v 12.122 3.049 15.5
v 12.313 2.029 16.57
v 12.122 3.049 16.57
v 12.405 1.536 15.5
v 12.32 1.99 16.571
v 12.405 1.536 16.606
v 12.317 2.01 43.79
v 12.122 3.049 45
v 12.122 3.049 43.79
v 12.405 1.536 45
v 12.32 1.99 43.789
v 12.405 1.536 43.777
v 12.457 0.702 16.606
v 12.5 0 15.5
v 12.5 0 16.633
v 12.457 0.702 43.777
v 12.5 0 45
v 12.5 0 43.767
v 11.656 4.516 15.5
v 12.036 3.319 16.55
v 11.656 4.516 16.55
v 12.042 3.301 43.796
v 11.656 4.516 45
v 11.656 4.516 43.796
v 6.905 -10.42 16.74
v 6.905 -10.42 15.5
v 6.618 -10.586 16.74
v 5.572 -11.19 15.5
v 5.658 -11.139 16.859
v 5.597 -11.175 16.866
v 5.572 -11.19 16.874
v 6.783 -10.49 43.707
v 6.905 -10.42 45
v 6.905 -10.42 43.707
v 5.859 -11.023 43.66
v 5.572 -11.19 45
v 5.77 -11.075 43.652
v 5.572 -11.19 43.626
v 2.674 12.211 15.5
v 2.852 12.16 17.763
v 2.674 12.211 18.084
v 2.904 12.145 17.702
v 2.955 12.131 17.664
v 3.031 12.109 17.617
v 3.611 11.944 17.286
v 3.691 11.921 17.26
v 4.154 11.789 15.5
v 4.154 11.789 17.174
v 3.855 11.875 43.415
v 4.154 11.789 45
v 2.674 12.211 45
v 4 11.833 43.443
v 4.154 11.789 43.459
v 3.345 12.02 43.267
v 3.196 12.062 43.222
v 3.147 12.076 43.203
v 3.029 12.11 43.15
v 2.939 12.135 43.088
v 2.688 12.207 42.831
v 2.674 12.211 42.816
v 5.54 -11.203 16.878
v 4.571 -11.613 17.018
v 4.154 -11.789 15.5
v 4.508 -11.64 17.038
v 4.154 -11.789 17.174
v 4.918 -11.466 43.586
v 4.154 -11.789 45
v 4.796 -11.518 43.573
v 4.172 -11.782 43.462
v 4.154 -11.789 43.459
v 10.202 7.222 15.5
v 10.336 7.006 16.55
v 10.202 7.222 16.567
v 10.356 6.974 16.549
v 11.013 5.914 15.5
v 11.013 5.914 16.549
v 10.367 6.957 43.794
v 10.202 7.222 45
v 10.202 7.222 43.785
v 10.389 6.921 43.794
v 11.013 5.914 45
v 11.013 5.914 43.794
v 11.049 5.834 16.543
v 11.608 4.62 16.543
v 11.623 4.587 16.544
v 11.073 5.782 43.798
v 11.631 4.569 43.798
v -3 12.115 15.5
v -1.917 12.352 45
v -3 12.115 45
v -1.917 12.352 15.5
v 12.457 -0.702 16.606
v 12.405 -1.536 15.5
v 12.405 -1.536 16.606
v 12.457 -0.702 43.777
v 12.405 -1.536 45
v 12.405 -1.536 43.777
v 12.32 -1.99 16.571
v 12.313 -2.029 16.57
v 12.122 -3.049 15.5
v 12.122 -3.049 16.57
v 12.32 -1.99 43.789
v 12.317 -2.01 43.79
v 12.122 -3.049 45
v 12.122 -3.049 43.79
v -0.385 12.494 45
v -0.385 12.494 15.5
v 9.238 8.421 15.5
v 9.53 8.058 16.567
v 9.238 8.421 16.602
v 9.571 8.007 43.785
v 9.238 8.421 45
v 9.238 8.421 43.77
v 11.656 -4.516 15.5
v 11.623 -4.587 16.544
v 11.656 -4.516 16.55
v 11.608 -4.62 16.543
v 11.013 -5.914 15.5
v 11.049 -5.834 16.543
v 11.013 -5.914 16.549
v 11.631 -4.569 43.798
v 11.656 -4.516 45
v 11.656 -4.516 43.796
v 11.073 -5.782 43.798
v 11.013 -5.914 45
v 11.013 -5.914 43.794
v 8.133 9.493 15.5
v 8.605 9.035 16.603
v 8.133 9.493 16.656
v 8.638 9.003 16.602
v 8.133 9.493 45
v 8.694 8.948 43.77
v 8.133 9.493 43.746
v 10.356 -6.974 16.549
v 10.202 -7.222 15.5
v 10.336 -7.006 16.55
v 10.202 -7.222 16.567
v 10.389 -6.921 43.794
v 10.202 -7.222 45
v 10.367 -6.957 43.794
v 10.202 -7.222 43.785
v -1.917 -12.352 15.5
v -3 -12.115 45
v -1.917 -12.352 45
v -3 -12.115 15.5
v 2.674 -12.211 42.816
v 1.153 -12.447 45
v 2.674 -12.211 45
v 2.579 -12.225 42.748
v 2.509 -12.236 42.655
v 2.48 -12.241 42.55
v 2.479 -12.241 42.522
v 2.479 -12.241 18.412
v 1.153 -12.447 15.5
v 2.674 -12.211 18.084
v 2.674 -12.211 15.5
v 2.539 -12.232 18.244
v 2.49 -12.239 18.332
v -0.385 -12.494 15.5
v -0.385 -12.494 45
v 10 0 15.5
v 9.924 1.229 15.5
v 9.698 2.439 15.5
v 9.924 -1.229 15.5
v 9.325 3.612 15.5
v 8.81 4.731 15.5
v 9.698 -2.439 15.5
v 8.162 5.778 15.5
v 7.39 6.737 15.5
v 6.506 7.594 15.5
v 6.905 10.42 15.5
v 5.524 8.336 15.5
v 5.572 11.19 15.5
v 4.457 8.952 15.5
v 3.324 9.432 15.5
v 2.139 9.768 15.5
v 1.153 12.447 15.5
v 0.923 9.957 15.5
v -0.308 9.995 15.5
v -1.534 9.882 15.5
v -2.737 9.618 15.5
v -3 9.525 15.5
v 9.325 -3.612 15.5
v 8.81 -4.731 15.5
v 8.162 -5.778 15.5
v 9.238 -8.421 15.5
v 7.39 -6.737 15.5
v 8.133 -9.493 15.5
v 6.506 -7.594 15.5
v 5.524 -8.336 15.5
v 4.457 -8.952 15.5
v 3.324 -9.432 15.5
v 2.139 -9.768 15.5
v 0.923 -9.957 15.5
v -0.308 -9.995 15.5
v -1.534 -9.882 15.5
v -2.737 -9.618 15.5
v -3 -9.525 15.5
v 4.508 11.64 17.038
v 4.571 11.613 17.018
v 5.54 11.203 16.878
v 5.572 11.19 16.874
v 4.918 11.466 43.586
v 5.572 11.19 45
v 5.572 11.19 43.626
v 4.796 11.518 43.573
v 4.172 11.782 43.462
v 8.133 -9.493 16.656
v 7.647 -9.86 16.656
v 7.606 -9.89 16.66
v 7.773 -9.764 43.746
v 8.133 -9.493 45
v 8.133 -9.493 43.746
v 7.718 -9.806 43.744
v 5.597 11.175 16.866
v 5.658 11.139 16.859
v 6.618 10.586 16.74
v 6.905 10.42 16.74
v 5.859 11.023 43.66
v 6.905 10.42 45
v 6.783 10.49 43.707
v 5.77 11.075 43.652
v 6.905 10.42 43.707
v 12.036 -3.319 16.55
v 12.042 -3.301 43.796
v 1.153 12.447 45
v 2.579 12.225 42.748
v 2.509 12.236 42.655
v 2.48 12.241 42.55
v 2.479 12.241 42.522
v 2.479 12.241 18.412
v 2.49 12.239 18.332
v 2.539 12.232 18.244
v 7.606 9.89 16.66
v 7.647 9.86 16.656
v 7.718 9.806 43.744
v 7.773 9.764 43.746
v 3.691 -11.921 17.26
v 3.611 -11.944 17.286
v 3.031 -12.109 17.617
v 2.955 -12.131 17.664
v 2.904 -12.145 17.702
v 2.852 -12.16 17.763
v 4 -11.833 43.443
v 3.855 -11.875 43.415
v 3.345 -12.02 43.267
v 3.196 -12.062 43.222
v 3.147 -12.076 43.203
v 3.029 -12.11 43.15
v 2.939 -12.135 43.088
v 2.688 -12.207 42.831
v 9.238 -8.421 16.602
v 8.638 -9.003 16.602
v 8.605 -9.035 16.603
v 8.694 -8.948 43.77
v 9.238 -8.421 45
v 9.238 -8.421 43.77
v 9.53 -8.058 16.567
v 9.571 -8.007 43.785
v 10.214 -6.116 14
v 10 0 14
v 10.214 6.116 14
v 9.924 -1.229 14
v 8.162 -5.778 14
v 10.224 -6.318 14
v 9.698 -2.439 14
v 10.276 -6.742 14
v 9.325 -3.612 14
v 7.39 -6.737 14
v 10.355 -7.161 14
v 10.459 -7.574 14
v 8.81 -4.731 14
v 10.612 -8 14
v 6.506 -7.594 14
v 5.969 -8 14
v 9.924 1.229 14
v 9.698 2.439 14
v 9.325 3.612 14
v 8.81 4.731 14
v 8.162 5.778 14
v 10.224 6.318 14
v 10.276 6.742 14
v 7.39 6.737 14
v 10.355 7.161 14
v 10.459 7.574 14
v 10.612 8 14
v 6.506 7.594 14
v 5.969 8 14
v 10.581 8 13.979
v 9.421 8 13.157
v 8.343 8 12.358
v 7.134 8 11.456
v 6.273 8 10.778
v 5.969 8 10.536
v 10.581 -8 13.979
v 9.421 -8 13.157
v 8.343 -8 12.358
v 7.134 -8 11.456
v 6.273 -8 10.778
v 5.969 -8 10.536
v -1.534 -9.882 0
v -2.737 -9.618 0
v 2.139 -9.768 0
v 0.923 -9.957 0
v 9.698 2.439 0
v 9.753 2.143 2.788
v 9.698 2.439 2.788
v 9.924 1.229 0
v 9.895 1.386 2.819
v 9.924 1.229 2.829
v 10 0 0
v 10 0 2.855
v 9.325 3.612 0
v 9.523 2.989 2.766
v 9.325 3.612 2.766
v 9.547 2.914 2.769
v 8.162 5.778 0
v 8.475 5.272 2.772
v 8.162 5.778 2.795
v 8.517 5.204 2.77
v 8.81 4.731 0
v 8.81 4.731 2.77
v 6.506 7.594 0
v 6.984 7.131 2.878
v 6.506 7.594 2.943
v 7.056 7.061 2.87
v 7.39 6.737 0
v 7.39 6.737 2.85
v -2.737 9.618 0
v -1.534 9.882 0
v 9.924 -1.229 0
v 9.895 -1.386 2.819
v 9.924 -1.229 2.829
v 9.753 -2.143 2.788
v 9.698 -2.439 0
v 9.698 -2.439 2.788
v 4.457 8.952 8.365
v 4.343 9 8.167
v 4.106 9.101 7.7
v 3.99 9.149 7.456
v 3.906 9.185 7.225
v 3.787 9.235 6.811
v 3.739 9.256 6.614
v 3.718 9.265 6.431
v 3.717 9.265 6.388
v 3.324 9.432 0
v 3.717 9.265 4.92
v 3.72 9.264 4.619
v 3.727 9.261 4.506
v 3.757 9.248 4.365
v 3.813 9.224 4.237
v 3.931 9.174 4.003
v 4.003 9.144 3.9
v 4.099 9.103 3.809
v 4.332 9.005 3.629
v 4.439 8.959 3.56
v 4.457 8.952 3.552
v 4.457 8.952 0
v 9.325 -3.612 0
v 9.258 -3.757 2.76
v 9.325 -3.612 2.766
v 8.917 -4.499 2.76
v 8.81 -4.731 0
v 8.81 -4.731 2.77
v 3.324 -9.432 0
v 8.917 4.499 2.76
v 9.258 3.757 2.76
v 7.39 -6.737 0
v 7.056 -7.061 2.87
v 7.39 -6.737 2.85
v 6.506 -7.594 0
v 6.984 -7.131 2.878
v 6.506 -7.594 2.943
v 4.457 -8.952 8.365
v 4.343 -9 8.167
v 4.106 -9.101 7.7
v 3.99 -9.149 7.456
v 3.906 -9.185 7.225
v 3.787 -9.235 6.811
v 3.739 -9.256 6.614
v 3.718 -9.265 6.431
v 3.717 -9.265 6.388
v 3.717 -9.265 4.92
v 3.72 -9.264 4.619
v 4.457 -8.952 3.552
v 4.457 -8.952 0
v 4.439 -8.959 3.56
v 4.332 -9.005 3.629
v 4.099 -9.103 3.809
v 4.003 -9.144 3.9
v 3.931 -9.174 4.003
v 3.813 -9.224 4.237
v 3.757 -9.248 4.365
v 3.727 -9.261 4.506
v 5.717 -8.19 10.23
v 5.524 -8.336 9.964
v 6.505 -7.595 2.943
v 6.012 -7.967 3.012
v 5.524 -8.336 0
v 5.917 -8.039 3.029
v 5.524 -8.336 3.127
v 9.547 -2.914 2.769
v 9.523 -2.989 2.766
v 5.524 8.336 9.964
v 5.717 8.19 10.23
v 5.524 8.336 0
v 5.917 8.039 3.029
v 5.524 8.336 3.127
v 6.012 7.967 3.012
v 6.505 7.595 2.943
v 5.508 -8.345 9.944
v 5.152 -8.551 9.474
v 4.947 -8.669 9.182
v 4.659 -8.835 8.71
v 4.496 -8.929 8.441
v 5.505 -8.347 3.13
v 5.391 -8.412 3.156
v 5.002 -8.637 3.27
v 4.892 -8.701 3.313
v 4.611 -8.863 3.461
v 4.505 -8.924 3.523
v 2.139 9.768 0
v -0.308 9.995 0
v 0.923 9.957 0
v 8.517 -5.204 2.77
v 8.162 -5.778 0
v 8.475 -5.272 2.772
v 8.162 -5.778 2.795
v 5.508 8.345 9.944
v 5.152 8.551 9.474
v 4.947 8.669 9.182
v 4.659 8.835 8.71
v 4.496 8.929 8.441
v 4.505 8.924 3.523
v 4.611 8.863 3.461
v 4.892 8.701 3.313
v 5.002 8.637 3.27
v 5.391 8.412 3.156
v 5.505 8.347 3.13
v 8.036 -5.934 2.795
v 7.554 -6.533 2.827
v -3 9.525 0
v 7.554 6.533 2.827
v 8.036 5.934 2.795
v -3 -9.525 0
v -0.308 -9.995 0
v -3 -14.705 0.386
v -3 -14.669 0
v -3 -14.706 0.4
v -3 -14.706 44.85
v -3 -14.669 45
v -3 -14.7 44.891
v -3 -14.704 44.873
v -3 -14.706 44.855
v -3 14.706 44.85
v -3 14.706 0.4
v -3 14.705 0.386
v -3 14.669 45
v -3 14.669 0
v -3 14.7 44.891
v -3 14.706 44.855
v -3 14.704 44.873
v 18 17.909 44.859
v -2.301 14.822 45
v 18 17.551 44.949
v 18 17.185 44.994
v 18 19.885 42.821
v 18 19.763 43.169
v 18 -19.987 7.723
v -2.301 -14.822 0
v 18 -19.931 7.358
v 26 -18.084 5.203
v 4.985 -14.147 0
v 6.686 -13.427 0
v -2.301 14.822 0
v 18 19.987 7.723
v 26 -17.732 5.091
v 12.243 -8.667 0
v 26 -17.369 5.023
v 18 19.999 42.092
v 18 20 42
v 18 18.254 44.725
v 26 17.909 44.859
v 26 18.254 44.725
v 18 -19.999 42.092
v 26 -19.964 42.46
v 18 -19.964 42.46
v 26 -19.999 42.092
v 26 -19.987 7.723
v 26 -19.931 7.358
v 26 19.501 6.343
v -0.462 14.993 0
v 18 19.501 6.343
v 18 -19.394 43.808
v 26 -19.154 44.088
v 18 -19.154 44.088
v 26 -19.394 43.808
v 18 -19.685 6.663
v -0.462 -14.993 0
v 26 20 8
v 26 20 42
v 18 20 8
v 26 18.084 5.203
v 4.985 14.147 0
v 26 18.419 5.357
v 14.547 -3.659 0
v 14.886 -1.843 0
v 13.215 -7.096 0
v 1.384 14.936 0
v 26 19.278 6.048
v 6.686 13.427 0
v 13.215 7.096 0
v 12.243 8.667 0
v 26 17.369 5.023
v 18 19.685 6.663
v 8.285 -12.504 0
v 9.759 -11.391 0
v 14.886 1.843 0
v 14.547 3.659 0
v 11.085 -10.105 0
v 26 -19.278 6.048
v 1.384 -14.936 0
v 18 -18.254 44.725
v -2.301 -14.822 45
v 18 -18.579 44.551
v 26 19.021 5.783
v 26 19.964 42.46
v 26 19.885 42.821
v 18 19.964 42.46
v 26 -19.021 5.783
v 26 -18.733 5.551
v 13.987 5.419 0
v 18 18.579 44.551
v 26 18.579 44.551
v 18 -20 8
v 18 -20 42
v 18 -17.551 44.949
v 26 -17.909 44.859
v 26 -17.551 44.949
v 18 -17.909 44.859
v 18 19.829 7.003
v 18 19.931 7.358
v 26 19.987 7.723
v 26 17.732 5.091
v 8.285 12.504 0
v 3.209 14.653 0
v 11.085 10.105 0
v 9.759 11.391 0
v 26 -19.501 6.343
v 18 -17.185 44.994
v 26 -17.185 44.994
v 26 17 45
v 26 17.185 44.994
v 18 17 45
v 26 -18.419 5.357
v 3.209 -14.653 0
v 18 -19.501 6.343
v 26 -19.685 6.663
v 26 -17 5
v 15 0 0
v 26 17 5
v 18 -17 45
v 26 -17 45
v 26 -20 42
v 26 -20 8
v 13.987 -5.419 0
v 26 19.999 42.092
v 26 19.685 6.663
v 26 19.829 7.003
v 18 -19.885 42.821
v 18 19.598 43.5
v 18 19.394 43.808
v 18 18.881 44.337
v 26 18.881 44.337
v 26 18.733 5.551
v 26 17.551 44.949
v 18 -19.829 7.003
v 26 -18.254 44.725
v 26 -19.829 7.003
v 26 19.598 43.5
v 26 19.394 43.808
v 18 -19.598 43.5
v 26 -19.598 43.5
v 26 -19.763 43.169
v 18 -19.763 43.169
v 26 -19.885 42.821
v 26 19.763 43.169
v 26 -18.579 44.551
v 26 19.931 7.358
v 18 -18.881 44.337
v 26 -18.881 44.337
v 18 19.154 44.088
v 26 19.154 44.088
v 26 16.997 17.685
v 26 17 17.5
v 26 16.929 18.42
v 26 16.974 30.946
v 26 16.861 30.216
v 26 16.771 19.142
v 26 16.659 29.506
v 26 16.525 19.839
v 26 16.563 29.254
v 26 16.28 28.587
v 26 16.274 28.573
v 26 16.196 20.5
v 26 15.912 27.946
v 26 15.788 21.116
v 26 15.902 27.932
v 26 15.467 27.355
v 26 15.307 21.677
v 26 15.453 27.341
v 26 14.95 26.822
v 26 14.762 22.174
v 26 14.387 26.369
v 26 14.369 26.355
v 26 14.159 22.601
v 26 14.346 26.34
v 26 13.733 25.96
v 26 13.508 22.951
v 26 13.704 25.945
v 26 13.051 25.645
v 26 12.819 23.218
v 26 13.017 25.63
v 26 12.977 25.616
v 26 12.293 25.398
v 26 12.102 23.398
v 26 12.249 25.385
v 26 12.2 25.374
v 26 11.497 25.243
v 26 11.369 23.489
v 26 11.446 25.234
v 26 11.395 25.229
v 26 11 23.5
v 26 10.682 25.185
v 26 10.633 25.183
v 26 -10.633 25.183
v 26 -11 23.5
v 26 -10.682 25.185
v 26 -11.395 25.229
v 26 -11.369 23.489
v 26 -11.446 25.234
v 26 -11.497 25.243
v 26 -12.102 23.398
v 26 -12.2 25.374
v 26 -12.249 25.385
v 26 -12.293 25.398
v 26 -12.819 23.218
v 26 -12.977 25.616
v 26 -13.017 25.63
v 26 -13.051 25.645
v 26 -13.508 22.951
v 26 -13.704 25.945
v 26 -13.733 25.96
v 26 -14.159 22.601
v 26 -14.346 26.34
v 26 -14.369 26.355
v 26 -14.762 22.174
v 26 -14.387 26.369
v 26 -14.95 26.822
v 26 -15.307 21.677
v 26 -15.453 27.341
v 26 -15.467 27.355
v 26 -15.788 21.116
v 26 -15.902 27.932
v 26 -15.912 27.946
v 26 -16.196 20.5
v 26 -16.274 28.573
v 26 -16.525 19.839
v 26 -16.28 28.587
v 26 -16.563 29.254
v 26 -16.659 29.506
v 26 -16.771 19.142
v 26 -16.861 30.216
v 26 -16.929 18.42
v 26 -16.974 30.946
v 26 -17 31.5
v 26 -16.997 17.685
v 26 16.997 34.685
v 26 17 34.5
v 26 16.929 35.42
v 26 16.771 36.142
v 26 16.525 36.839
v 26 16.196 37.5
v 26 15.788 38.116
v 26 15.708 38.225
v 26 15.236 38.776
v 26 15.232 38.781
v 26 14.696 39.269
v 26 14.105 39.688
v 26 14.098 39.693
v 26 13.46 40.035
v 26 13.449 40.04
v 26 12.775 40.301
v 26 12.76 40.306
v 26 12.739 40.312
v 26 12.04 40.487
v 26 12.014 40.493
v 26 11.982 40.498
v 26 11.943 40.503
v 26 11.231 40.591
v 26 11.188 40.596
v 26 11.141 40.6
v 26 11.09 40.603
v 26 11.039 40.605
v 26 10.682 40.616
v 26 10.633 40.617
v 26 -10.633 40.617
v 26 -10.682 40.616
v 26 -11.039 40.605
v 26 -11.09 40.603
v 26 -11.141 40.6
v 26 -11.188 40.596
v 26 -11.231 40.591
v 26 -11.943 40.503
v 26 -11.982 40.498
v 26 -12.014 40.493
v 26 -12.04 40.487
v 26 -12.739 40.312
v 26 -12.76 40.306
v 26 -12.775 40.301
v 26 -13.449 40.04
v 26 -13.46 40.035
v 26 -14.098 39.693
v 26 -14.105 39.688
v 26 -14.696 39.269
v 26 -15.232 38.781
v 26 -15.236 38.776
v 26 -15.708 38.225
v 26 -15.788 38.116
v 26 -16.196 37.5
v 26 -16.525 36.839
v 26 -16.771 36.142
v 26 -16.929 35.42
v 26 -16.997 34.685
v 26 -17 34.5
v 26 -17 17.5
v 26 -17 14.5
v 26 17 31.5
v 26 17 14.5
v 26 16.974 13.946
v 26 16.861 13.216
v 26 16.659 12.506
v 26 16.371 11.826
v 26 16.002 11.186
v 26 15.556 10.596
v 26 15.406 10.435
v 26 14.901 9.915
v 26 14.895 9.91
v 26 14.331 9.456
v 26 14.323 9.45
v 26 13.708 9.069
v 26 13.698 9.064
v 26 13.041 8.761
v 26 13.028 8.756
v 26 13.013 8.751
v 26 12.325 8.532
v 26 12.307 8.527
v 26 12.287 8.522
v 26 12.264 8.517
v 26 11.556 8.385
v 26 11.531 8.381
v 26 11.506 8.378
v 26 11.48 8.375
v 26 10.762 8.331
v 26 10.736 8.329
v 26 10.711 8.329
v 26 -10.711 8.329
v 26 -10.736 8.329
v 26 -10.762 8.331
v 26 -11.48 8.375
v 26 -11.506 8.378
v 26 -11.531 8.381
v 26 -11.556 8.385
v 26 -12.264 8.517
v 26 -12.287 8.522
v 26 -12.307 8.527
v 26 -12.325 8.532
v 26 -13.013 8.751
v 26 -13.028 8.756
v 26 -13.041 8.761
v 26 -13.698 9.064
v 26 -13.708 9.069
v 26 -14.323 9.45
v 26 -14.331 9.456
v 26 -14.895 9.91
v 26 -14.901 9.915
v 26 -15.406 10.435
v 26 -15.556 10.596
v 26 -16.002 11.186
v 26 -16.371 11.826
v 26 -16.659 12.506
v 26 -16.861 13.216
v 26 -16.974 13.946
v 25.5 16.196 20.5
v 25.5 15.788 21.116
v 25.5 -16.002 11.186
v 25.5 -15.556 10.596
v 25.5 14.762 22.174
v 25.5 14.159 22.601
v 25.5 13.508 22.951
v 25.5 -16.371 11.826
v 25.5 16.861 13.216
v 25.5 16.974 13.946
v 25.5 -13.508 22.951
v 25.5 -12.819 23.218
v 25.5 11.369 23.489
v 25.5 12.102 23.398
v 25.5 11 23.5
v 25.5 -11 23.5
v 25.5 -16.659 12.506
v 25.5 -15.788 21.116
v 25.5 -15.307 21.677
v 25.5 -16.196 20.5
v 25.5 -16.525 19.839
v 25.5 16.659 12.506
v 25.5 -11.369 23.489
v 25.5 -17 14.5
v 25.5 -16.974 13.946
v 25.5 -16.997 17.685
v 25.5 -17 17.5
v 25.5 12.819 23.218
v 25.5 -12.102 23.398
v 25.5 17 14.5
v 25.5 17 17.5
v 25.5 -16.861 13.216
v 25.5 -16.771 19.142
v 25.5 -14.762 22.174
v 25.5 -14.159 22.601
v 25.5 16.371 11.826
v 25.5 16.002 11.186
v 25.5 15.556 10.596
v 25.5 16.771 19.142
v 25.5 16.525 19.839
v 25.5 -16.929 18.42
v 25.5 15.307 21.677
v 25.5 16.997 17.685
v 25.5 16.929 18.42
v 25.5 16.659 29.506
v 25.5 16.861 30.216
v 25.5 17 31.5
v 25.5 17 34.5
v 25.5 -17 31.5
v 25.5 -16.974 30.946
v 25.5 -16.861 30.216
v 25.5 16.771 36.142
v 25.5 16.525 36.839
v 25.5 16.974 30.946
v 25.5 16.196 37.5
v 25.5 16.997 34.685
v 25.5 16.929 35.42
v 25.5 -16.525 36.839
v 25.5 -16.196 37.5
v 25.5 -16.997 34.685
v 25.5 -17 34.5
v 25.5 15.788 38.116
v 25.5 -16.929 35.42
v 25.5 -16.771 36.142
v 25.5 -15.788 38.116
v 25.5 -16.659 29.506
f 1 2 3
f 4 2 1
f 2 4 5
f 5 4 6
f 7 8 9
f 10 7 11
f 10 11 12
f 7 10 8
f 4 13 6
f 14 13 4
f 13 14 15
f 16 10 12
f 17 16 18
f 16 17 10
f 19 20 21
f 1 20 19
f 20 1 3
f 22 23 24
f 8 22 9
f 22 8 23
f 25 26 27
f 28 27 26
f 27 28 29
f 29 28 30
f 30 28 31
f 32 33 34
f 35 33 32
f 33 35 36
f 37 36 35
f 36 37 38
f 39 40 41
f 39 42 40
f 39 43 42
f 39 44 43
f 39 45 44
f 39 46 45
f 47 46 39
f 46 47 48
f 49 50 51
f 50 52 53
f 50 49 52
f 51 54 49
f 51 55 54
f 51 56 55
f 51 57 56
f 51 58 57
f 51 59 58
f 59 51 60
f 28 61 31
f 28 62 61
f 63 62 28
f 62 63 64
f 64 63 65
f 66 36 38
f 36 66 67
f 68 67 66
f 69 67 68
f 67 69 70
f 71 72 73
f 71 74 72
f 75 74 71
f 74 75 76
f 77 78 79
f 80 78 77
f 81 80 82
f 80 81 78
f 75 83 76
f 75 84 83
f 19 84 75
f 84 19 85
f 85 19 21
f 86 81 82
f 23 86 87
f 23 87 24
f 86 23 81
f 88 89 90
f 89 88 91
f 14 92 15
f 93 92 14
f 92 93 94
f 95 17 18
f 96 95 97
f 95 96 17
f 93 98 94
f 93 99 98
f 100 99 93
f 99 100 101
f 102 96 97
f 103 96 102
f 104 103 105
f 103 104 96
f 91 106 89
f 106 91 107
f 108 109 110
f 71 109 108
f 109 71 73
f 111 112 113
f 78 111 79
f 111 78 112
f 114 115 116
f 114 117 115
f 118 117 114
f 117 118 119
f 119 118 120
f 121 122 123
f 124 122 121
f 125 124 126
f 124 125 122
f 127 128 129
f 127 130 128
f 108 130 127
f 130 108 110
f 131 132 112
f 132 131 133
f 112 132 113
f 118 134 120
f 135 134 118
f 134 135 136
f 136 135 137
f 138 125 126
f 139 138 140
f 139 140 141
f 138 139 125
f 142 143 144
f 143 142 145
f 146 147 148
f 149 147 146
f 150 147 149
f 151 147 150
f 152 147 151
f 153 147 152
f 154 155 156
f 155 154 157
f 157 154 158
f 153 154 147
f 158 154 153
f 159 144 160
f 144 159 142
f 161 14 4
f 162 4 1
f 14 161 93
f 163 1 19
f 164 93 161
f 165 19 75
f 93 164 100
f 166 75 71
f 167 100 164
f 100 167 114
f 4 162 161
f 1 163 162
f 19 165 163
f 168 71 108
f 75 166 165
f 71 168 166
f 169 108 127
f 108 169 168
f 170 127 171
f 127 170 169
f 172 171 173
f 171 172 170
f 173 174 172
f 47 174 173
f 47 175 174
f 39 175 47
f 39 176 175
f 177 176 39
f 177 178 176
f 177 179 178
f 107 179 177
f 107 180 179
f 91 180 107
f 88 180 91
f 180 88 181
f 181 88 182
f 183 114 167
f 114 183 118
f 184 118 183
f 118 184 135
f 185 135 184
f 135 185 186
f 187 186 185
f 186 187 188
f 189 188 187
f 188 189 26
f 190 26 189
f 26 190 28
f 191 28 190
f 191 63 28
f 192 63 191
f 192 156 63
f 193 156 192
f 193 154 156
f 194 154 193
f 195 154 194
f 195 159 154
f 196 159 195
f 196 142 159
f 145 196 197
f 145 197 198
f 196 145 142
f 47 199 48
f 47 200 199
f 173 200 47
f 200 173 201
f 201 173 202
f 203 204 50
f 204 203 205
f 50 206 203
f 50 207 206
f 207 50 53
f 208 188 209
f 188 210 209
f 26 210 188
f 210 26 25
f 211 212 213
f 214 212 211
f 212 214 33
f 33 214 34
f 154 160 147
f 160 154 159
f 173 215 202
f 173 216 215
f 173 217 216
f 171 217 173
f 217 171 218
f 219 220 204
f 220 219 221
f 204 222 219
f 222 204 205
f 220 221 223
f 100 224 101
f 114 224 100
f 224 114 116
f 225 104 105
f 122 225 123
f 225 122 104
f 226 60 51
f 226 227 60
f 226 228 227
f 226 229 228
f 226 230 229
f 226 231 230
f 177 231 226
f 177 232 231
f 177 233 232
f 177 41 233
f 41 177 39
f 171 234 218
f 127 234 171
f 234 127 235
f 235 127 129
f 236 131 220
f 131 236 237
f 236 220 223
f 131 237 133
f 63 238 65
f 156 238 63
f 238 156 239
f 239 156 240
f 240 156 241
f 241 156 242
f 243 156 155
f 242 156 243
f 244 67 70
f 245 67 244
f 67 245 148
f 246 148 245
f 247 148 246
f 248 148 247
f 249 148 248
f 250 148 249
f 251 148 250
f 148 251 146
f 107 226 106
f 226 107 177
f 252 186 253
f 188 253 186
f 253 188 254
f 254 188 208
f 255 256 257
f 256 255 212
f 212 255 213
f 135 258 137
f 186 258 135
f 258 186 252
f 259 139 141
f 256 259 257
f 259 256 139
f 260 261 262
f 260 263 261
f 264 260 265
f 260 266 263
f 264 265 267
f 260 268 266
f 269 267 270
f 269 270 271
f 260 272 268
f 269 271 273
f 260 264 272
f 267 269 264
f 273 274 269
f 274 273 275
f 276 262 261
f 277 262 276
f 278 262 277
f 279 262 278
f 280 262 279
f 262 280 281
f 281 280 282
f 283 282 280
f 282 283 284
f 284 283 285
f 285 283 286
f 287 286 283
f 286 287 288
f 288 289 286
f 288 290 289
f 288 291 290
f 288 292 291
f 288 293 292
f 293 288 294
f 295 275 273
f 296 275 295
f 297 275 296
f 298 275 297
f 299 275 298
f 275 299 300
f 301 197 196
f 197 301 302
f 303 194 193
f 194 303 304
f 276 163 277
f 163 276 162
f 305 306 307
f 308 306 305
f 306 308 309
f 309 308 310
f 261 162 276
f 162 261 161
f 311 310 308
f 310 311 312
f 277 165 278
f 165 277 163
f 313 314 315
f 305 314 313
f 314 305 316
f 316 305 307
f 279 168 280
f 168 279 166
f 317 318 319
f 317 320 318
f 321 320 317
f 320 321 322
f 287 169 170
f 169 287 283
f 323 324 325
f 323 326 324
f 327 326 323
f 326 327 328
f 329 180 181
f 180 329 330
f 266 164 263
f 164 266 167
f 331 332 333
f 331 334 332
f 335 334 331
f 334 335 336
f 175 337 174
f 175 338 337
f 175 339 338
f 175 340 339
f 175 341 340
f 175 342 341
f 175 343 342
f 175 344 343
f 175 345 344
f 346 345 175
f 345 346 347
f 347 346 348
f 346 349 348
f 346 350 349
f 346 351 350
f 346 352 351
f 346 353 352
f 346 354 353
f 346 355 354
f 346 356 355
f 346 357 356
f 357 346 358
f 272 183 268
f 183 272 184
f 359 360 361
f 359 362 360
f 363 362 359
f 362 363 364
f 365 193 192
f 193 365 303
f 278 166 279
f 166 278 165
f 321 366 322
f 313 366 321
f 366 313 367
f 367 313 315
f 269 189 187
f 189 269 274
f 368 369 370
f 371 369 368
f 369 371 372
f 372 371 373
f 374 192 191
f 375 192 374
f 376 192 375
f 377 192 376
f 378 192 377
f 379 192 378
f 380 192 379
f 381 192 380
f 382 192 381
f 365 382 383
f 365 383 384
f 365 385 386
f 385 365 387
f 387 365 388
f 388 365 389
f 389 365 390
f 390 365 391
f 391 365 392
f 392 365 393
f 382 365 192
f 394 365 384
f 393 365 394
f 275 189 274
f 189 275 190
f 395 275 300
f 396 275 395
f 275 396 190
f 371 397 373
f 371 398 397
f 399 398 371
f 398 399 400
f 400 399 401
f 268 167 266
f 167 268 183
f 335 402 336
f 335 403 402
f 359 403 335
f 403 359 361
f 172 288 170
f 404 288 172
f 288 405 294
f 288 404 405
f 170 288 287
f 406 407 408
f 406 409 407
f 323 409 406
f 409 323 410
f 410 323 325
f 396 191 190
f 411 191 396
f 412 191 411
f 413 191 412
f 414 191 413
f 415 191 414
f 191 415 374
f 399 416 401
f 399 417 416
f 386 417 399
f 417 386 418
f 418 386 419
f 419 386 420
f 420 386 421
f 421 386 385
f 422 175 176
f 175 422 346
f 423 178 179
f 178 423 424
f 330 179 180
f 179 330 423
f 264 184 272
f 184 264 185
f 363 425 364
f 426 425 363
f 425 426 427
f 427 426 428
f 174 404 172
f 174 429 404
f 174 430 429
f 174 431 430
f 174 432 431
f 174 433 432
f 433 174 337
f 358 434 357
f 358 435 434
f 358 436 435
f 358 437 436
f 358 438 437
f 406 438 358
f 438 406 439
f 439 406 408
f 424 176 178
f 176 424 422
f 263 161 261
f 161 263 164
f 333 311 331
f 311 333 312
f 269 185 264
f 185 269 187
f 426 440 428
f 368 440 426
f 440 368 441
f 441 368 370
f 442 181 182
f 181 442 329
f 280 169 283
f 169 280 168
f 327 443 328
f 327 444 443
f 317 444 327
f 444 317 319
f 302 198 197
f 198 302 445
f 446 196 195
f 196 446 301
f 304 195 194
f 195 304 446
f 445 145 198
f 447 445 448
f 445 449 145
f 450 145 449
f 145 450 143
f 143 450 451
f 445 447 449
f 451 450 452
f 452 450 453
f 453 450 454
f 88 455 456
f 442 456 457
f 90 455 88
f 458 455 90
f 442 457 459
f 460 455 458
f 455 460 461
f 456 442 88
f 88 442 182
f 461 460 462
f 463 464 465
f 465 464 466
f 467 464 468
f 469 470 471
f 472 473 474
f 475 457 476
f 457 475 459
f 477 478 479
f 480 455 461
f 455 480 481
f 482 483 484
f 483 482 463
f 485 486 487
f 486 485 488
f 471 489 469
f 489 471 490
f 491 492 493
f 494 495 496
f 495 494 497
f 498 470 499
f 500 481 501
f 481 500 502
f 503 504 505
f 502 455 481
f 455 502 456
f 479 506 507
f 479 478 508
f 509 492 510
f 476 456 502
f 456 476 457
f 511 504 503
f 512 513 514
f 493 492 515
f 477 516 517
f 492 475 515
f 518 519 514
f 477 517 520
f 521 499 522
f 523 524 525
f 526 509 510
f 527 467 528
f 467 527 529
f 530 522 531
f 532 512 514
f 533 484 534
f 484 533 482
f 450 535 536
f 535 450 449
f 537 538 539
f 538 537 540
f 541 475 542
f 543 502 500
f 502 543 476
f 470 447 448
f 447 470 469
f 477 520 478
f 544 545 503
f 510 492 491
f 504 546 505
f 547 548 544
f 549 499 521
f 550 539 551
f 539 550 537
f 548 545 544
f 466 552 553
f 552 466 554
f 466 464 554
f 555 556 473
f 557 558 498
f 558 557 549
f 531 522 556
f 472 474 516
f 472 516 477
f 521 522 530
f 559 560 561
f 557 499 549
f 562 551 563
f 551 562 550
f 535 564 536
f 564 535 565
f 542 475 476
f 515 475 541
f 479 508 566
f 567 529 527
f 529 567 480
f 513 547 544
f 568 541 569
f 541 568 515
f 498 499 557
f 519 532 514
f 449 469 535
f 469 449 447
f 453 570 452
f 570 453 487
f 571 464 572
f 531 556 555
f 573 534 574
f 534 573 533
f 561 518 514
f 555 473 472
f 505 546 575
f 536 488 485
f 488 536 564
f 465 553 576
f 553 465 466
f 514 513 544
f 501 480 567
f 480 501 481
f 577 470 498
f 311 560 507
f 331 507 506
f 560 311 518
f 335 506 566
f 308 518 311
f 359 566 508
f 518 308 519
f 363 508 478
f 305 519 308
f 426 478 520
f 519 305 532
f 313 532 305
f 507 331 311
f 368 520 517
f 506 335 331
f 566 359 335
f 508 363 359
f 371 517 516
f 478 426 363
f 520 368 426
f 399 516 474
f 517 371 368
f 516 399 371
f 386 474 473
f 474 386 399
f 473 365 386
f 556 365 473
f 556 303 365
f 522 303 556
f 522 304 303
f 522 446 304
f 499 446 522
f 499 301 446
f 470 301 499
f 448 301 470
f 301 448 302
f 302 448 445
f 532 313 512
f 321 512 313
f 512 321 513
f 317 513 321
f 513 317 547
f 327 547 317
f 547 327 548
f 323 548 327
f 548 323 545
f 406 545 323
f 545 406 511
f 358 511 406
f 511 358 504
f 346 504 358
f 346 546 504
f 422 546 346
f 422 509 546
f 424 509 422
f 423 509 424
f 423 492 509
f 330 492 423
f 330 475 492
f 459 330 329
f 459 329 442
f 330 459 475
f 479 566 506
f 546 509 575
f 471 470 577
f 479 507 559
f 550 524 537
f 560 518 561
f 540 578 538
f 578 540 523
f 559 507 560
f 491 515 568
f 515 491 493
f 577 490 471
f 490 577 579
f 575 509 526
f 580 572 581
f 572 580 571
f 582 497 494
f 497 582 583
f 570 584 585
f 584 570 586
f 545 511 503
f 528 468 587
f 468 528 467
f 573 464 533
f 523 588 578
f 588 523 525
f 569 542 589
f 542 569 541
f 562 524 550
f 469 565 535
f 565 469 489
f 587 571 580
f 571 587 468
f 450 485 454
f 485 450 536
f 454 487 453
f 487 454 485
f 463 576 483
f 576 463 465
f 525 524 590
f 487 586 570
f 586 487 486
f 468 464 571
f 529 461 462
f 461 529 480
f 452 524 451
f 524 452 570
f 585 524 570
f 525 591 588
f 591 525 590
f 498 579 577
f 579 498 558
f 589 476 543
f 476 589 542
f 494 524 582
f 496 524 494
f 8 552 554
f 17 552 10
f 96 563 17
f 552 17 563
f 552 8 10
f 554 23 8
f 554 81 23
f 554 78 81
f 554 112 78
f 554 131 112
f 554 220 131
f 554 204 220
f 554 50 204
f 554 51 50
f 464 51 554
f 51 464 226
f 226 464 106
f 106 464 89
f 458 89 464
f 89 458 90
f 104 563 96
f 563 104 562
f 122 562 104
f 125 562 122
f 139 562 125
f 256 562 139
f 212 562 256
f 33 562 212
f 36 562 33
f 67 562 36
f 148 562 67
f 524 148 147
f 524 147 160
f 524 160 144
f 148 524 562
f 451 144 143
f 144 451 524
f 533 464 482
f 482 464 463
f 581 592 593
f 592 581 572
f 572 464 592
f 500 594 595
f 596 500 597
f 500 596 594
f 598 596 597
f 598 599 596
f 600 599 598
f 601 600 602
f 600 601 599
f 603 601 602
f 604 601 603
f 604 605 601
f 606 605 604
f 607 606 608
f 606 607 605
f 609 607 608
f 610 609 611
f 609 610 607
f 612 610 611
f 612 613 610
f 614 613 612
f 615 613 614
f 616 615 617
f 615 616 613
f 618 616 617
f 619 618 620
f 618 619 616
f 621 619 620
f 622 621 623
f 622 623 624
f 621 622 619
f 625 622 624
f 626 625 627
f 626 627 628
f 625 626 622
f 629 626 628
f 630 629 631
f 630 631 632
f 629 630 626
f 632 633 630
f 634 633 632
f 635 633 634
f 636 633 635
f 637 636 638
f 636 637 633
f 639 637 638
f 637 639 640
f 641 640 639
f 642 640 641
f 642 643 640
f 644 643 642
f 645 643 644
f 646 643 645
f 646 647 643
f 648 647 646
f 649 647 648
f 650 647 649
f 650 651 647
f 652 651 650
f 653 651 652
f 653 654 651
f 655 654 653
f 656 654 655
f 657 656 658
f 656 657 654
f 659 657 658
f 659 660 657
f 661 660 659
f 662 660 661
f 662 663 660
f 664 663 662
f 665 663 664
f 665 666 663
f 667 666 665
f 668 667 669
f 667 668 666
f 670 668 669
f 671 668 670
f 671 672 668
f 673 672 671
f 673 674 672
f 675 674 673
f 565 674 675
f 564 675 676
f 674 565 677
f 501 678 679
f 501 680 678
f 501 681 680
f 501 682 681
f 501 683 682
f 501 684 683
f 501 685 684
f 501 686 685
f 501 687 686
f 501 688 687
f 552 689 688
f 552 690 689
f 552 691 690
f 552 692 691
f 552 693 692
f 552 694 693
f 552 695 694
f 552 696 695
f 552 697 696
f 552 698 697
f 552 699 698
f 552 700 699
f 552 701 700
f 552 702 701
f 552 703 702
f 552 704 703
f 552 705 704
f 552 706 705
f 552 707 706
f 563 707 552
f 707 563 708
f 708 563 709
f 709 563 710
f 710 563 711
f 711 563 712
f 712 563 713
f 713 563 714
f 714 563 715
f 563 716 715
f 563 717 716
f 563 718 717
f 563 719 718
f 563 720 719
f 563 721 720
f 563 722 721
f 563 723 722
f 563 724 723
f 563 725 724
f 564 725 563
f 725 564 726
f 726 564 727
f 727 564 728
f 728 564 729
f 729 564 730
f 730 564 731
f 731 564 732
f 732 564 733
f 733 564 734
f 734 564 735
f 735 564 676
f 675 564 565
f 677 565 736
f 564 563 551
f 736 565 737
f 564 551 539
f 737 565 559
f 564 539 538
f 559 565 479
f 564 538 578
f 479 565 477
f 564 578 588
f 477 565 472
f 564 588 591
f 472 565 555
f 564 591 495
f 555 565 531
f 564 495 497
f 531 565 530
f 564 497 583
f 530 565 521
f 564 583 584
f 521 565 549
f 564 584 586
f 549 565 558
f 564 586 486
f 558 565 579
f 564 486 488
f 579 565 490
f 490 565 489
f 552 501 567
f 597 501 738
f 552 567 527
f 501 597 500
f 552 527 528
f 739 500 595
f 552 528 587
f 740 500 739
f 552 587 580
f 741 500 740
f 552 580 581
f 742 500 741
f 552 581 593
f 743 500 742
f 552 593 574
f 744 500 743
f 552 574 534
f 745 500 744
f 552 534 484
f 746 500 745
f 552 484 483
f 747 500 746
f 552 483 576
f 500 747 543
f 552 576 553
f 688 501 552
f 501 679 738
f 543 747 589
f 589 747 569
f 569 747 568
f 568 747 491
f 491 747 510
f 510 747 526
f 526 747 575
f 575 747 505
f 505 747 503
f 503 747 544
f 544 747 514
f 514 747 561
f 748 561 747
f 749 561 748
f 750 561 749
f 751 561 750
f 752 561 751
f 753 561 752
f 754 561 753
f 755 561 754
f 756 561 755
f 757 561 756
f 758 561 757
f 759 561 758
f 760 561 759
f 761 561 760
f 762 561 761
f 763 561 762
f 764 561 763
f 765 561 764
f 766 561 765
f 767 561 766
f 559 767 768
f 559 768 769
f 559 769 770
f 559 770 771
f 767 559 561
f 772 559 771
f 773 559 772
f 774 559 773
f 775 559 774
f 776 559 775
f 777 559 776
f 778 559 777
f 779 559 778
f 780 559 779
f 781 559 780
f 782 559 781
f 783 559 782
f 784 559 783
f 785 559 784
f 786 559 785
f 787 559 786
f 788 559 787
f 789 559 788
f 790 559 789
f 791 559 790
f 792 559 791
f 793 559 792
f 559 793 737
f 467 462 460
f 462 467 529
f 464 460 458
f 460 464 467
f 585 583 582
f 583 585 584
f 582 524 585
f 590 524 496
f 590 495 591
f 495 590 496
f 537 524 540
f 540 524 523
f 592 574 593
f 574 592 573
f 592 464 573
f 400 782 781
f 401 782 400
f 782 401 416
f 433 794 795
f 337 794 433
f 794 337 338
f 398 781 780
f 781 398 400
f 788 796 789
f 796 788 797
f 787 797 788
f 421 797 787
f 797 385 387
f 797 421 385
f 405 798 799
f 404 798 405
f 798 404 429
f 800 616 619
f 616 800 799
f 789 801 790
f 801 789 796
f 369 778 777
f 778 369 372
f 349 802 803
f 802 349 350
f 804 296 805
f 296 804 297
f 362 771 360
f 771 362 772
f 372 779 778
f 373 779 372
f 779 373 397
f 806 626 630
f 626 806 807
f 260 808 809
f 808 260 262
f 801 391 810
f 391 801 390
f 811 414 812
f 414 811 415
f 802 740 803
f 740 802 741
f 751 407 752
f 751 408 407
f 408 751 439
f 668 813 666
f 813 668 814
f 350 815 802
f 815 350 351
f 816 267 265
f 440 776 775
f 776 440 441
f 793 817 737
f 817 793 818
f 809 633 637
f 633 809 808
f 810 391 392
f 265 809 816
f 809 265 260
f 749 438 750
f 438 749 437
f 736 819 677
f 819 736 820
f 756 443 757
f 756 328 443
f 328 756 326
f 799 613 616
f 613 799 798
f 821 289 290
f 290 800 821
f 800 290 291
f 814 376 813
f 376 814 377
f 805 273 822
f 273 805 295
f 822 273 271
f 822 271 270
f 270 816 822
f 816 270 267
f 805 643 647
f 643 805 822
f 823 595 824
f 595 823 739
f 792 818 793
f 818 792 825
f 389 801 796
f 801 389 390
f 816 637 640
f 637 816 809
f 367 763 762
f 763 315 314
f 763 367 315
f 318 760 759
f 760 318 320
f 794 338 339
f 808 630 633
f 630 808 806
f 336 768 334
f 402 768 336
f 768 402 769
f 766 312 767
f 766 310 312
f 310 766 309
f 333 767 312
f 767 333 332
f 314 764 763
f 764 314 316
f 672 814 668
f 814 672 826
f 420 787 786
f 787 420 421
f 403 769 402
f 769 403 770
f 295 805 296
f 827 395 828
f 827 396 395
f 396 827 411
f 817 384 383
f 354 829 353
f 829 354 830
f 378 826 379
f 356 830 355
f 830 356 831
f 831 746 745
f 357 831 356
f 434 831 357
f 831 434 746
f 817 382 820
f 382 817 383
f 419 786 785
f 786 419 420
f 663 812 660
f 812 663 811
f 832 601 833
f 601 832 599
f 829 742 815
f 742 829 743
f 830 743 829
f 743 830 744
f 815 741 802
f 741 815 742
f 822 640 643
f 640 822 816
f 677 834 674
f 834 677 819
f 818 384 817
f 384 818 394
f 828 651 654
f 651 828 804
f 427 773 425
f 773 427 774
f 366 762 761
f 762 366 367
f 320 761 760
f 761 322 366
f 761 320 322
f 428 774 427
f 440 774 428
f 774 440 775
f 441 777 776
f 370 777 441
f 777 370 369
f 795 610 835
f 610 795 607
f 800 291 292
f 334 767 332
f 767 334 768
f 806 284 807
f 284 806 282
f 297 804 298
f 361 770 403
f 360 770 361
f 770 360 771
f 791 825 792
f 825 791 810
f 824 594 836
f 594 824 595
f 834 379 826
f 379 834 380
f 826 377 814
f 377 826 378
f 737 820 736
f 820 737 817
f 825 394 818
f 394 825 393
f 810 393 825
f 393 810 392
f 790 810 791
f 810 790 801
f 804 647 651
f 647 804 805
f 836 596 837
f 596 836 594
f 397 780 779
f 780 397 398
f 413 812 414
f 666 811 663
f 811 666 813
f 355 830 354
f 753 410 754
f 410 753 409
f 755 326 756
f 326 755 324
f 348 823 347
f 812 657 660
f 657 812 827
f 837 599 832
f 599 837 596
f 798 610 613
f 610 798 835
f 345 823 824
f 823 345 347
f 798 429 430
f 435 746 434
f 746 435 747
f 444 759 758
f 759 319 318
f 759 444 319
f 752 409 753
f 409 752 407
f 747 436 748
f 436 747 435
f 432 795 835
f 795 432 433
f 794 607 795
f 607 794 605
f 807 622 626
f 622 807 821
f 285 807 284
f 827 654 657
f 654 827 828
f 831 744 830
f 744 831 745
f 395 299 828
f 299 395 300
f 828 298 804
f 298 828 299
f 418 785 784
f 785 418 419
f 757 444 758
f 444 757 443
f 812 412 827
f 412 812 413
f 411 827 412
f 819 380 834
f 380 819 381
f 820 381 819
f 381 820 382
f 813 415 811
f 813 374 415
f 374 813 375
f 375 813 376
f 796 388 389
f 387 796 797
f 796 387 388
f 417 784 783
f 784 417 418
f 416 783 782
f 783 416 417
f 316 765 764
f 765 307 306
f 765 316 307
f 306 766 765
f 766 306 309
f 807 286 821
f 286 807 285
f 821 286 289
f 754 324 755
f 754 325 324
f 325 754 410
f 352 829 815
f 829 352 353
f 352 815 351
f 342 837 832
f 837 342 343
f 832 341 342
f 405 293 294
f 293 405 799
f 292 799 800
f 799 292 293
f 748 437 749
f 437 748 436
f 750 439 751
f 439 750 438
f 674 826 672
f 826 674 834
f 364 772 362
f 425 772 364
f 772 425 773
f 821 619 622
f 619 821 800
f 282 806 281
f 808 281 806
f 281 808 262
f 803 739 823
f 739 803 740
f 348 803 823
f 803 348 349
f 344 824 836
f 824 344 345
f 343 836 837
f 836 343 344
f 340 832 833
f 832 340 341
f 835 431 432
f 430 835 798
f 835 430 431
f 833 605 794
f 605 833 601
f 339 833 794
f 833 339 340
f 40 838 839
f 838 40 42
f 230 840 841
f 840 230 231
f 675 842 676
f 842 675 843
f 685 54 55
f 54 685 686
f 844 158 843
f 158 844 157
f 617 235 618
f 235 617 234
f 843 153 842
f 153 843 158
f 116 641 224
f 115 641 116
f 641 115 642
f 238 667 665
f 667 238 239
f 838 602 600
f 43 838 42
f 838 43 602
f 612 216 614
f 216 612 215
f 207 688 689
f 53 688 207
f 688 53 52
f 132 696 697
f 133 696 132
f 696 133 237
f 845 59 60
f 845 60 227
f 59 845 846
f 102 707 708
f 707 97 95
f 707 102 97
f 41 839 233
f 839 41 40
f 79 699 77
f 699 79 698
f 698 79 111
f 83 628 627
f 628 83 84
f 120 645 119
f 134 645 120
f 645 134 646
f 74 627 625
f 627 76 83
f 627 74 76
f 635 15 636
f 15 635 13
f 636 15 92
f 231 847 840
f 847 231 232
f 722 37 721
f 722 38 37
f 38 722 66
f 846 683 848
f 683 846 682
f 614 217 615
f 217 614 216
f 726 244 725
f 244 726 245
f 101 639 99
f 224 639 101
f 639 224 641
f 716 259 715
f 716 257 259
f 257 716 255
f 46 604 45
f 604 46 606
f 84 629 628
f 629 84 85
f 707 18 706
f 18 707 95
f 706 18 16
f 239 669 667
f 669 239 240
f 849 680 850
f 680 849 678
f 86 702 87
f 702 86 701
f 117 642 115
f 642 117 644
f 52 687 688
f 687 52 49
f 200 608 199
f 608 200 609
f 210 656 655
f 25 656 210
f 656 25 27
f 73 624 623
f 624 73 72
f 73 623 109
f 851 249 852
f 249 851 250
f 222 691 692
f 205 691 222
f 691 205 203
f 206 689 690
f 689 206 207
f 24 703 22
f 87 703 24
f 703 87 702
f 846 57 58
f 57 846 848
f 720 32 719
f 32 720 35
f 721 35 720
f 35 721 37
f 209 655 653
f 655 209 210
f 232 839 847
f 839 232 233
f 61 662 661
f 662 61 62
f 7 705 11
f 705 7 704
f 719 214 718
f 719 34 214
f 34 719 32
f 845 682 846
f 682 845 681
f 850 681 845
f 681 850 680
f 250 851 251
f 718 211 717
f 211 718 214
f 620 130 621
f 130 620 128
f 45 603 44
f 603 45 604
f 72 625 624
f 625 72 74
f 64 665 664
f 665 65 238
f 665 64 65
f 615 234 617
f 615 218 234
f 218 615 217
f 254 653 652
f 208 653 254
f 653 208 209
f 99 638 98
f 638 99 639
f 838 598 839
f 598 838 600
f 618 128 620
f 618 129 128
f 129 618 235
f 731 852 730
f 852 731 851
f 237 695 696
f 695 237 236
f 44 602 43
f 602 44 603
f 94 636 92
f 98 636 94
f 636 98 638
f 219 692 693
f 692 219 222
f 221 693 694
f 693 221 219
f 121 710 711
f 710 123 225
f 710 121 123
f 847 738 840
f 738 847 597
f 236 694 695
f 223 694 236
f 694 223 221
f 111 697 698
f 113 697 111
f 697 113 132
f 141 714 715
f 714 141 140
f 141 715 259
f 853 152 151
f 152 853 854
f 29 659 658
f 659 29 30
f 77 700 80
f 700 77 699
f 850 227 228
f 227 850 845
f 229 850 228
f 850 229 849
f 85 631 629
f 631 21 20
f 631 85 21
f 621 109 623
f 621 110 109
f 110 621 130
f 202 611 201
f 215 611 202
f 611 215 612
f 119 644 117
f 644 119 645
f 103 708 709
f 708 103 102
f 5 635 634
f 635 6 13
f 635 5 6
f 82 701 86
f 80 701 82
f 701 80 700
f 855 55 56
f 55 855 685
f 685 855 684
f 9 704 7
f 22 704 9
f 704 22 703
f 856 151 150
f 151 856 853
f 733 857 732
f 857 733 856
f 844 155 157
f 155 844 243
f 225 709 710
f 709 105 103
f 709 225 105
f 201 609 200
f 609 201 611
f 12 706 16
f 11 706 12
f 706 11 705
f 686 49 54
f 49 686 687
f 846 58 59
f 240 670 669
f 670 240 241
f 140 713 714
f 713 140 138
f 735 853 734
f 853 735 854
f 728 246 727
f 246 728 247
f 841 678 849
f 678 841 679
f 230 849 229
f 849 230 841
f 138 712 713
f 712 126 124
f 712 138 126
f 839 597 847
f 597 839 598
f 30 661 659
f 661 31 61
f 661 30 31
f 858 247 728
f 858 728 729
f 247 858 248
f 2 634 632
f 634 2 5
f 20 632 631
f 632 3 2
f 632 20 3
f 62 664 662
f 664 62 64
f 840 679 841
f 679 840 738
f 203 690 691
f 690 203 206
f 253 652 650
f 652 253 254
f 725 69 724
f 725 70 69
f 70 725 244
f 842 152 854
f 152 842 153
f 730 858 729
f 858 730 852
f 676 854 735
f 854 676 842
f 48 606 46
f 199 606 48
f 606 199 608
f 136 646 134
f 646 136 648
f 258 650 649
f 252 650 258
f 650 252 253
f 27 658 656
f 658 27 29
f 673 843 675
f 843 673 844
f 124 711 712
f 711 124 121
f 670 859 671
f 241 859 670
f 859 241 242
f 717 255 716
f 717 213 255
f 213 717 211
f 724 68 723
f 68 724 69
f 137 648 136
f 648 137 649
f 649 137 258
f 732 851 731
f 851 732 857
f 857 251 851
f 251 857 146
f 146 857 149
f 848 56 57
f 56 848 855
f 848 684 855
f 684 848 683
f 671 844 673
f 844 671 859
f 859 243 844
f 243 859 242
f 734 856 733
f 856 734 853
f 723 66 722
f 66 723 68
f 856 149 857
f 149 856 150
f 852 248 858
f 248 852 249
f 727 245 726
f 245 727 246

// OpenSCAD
use <MCAD/boxes.scad>
$fn =51;

module extruder() {
    translate([0,0,15.5]) cylinder(d=25, h=30);
    translate([4,0,10]) cube([16,16,8], center=true);
    cylinder(d1=1, d2=7, h=6);
}


module fan() {
    rotate([0,90,0]) difference() {
        roundedBox([40,40,8], 3, true);
        cylinder(d=38,h=20, center=true);
    }
}

duct_diameter = 38;

module cooler_old() {
    difference() {
        hull() {
            translate([18,0,-4]) fan();
            translate([0,0,0]) cylinder(d=27,h=30, center=true);
        }
        hull() {
           translate([15,0,0]) rotate([0,70,0]) cylinder(d=31,h=20, center=true);
          translate([0,0,-5]) cylinder(d=25,h=28, center=true);
        }
        cylinder(d=24, h=100, center=true);
        translate([-10,0,0]) cube([20,20,100], center=true);
    }
}

duct_x = 26;

module top_duct() {
    hull() {
          translate([duct_x,0,33]) rotate([0,90,0]) 
              roundedBox([15,34,1], 6, true);
        translate([0,0,16]) cylinder(d=23, h=28);
    }
}
module bottom_duct() {
    hull() {
          translate([duct_x,0,16]) rotate([0,90,0]) 
              roundedBox([15,34,1], 6, true);
        translate([0,0,2]) cylinder(d=15, h=1);
    }
}

module keep_out() {
    union() {
        translate([0,0,-0.1]) cylinder(d = 20, h=16);
        translate([-23,0,39]) cube([40,40,80], center=true);
        extruder();
    }
}

module cooler() {
    difference() {
        hull() {
            translate([duct_x-4,0,25]) fan();
            cylinder(d=30,h=45);
        }
        bottom_duct();
        top_duct();
        keep_out();
    }
}

//rotate(180) extruder();
//translate([duct_x+4,0,25]) color("gray") fan();
cooler();
//bottom_duct();
//top_duct();
//keep_out();
